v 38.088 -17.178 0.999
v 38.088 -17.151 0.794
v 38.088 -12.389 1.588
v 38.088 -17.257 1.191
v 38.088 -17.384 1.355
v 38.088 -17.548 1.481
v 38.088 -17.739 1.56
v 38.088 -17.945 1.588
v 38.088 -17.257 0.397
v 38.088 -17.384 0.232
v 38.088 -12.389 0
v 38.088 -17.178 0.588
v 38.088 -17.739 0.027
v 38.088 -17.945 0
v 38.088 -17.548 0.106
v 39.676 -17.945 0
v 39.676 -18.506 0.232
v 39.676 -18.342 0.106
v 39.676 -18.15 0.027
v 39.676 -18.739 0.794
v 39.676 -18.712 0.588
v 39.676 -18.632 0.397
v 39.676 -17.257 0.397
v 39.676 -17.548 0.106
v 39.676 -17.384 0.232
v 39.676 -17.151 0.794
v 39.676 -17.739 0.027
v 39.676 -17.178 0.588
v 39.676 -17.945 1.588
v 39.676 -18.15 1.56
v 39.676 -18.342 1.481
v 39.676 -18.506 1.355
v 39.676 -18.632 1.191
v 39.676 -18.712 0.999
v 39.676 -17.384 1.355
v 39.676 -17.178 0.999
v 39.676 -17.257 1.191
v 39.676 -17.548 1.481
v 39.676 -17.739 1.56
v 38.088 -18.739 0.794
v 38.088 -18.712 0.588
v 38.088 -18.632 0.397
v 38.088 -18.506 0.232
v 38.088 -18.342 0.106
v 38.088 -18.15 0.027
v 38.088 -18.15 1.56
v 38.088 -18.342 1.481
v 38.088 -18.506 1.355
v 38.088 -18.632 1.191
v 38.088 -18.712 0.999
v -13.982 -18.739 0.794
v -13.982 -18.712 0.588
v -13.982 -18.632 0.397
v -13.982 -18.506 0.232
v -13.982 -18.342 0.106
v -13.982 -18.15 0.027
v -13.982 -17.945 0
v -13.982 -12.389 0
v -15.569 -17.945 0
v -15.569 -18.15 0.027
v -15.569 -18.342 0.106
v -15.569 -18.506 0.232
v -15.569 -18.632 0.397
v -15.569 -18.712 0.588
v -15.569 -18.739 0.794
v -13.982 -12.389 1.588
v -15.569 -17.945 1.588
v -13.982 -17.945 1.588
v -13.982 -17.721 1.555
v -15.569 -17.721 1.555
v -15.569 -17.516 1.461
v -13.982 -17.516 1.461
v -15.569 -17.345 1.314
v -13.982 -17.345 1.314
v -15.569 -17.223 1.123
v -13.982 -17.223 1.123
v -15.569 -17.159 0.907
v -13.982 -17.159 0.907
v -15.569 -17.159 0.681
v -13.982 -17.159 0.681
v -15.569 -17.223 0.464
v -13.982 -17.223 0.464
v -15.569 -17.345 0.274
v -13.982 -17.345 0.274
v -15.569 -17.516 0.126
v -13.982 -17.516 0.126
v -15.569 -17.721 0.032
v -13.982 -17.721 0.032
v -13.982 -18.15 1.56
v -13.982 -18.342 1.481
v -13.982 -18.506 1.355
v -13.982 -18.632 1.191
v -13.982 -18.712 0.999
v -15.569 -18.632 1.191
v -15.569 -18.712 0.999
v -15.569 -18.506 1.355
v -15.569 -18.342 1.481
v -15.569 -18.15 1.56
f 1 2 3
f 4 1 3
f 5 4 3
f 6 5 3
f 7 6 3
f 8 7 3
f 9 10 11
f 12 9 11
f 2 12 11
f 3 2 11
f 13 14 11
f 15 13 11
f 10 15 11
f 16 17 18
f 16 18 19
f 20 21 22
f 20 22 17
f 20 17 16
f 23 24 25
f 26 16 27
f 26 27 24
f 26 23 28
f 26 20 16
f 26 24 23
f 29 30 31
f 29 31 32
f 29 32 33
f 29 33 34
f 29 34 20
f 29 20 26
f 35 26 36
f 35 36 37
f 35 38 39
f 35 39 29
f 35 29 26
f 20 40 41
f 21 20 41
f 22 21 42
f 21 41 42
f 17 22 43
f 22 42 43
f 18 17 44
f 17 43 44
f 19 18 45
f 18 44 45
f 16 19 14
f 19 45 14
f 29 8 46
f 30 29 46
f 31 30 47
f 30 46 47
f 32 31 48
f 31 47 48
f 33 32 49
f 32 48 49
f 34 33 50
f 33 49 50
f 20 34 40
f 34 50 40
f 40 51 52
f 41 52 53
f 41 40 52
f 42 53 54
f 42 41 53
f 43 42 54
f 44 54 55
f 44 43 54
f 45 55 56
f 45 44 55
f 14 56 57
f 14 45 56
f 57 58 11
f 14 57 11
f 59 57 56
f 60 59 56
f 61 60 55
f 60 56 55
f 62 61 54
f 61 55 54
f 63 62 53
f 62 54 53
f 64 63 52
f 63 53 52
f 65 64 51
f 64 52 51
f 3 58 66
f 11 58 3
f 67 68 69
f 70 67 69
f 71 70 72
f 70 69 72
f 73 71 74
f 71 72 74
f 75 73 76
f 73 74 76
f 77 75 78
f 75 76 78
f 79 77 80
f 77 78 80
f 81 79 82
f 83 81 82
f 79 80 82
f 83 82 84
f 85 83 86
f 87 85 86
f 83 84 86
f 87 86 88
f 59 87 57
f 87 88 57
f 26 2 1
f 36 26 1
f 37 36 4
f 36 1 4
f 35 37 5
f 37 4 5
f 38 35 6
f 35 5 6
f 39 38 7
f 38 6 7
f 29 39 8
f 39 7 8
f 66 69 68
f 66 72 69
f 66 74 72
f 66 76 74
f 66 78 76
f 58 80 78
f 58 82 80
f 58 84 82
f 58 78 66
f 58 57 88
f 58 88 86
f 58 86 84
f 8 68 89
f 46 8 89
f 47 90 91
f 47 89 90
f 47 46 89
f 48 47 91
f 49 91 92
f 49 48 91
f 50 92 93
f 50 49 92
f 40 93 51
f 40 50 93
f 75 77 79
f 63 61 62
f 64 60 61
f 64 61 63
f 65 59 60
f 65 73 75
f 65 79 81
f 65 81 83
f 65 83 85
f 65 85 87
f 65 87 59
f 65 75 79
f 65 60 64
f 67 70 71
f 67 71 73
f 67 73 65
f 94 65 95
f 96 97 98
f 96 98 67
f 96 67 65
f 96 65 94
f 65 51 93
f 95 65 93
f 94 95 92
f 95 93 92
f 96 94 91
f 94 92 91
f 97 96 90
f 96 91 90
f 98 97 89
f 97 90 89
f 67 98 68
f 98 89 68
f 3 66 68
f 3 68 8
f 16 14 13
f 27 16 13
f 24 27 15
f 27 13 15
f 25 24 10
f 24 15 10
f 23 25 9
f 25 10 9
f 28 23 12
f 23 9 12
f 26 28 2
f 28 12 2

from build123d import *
from build123d import SkipClean  # not in build123d's __all__

# Parameters (mm, degrees)
F0_W     = 52.07
F0_H     = 6.35
F1_DEPTH = 1.5875
F3_DEPTH = 1.5875
F5_DEPTH = 1.5875
F6_DEPTH = 52.07


with BuildPart() as f1:
    # F0 (on Top) → F1 (new body)
    with BuildSketch(Plane.XY):
        with Locations((12.0531544089, -15.5635510429)):
            Rectangle(F0_W, F0_H)
    extrude(amount=F1_DEPTH)

    # F2 (on face) → F3 (join)
    with BuildSketch(Plane(origin=(-13.9818455911, 0, 0), x_dir=(0, -1, 0), z_dir=(-1, 0, 0))):
        with BuildLine():
            ThreePointArc((17.9448010429, 0), (18.5060670505, 0.2324839924), (18.7385510429, 0.79375))
            ThreePointArc((18.7385510429, 0.79375), (18.5060670505, 1.3550160076), (17.9448010429, 1.5875))
            ThreePointArc((17.9448010429, 1.5875), (17.1510510429, 0.79375), (17.9448010429, 0))
        make_face()
    extrude(amount=F3_DEPTH)

    # F4 (on face) → F5 (join)
    with BuildSketch(Plane.YZ.offset(38.0881544089)):
        with BuildLine():
            ThreePointArc((-17.9448010429, 0), (-17.3835350353, 0.2324839924), (-17.1510510429, 0.79375))
            ThreePointArc((-17.1510510429, 0.79375), (-17.3835350353, 1.3550160076), (-17.9448010429, 1.5875))
            ThreePointArc((-17.9448010429, 1.5875), (-18.5060670505, 1.3550160076), (-18.7385510429, 0.79375))
            ThreePointArc((-18.7385510429, 0.79375), (-18.5060670505, 0.2324839924), (-17.9448010429, 0))
        make_face()
    extrude(amount=F5_DEPTH)

    # F6 (cut): faces of the model
    f6_faces = [f1.faces().sort_by_distance(p)[0] for p in [
        (38.0881544089, -18.5612527414, 1.4102016985),
        (38.0881544089, -18.5612527414, 0.1772983015),
    ]]
    with SkipClean():  # cleaning this boolean's faces spoils the solid; the shape is the same uncleaned
        extrude(f6_faces, amount=-F6_DEPTH, mode=Mode.SUBTRACT)


solid = f1.part
